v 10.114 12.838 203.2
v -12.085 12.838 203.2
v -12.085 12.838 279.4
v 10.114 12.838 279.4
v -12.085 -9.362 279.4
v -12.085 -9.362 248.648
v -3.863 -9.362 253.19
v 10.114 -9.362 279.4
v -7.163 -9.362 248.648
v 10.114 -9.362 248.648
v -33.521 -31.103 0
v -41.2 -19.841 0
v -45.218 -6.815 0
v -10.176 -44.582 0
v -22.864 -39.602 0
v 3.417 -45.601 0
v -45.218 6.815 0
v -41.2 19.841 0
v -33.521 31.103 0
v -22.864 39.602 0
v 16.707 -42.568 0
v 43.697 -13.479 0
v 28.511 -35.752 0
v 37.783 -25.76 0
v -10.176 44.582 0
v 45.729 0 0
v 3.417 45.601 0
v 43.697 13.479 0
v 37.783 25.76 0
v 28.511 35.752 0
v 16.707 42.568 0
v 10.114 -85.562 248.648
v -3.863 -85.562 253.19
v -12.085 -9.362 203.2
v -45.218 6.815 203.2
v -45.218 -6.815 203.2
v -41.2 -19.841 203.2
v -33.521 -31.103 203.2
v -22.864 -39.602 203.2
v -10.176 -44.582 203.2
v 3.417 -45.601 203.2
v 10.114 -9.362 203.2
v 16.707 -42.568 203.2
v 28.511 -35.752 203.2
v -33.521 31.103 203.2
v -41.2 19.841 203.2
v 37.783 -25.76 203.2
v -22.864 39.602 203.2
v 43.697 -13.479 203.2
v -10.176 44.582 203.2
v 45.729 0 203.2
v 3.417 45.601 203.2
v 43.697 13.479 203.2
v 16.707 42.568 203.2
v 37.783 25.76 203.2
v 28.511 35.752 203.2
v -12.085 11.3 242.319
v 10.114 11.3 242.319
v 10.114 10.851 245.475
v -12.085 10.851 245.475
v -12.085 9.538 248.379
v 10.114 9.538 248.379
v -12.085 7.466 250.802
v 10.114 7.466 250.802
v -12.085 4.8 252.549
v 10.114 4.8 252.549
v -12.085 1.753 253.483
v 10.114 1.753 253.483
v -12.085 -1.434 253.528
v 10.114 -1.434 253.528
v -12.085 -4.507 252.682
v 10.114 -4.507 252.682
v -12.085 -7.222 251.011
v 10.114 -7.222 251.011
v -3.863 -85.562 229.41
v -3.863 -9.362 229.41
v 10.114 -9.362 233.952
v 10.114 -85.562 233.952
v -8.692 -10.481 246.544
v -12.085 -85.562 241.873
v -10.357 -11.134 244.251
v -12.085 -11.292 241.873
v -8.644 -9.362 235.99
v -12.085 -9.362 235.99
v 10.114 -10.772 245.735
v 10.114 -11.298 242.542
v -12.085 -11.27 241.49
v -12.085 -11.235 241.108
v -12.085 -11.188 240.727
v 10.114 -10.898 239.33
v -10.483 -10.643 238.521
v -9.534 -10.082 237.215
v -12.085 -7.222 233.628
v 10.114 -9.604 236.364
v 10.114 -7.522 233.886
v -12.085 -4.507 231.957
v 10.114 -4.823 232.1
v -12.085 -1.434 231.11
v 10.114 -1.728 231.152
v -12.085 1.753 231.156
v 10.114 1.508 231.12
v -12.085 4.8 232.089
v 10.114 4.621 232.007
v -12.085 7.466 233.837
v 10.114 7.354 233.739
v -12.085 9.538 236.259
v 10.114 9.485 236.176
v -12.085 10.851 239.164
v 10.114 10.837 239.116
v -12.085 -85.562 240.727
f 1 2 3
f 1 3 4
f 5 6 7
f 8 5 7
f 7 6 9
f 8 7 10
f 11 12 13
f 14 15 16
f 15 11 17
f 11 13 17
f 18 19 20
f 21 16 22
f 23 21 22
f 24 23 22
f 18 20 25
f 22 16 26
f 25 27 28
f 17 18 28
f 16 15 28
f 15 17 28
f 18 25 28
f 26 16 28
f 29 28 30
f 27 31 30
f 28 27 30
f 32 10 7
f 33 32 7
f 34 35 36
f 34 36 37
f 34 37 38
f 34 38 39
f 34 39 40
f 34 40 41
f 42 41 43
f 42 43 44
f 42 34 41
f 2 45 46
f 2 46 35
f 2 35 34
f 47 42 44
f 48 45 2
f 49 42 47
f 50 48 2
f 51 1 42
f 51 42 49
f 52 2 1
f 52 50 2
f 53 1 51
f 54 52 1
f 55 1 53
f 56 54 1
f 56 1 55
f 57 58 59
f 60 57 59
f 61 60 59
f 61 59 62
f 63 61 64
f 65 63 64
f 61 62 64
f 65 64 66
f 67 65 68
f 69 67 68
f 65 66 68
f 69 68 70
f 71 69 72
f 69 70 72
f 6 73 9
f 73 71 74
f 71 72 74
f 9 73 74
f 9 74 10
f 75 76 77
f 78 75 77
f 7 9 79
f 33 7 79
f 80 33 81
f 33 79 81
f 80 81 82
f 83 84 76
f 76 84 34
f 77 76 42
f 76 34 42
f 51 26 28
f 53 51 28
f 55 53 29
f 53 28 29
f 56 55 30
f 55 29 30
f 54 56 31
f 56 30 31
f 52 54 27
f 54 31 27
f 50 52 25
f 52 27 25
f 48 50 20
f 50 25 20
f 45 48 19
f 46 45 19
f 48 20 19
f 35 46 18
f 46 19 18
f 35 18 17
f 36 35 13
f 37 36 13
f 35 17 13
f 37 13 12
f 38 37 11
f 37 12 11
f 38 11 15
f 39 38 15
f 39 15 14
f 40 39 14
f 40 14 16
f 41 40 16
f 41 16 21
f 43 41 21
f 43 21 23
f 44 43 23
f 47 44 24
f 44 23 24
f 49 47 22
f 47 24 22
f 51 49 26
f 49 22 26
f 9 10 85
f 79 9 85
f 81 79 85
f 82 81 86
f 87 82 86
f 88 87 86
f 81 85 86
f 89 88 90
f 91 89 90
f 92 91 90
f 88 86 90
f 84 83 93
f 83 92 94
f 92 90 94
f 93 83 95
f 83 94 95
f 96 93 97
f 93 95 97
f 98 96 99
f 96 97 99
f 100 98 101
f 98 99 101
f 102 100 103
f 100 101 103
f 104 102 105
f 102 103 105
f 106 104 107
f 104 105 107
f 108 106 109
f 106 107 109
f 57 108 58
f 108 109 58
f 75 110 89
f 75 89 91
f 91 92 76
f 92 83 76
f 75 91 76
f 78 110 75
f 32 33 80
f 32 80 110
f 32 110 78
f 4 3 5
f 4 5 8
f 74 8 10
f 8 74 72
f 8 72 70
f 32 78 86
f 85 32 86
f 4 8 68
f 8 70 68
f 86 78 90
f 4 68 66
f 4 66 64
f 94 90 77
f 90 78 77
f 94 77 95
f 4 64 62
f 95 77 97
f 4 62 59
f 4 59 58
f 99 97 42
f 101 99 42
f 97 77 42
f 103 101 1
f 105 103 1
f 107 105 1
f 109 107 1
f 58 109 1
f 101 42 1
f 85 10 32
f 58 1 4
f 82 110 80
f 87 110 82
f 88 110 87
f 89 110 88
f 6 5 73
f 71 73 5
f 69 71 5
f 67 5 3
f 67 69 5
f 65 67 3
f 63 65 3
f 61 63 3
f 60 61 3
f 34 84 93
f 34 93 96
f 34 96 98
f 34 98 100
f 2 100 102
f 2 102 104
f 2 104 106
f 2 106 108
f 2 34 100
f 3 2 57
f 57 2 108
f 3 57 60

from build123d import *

# Parameters (mm, degrees)
F0_R     = 45.728615
F1_DEPTH = 203.2
F2_W     = 22.199646
F2_H     = 22.19965
F3_DEPTH = 76.2
F5_DEPTH = 76.2
F7_DEPTH = 25.4


with BuildPart() as f1:
    # F0 (on Top) → F1 (new body)
    with BuildSketch(Plane.XY):
        Circle(F0_R)
    extrude(amount=F1_DEPTH)

    # F2 (on face) → F3 (join)
    with BuildSketch(Plane.XY.offset(203.2)):
        with Locations((-0.98564, 1.738166)):
            Rectangle(F2_W, F2_H)
    extrude(amount=F3_DEPTH)

    # F4 (on face) → F5 (join)
    with BuildSketch(Plane.XZ.offset(9.361659)):
        Polygon((10.114183, 233.951616), (10.114183, 248.648384), (-3.863274, 253.189935), (-12.085463, 241.873063), (-12.085463, 240.726937), (-3.863274, 229.410065), align=None)
    extrude(amount=F5_DEPTH)

    # F6 (on face) → F7 (cut)
    with BuildSketch(Plane.YZ.offset(10.114183)):
        with BuildLine():
            ThreePointArc((-9.361659, 248.648384), (-3.309659, 231.514529), (11.300335, 242.319331))
            ThreePointArc((11.300335, 242.319331), (3.309659, 253.124132), (-9.361659, 248.648384))
        make_face()
    extrude(amount=-F7_DEPTH, mode=Mode.SUBTRACT)


solid = f1.part
